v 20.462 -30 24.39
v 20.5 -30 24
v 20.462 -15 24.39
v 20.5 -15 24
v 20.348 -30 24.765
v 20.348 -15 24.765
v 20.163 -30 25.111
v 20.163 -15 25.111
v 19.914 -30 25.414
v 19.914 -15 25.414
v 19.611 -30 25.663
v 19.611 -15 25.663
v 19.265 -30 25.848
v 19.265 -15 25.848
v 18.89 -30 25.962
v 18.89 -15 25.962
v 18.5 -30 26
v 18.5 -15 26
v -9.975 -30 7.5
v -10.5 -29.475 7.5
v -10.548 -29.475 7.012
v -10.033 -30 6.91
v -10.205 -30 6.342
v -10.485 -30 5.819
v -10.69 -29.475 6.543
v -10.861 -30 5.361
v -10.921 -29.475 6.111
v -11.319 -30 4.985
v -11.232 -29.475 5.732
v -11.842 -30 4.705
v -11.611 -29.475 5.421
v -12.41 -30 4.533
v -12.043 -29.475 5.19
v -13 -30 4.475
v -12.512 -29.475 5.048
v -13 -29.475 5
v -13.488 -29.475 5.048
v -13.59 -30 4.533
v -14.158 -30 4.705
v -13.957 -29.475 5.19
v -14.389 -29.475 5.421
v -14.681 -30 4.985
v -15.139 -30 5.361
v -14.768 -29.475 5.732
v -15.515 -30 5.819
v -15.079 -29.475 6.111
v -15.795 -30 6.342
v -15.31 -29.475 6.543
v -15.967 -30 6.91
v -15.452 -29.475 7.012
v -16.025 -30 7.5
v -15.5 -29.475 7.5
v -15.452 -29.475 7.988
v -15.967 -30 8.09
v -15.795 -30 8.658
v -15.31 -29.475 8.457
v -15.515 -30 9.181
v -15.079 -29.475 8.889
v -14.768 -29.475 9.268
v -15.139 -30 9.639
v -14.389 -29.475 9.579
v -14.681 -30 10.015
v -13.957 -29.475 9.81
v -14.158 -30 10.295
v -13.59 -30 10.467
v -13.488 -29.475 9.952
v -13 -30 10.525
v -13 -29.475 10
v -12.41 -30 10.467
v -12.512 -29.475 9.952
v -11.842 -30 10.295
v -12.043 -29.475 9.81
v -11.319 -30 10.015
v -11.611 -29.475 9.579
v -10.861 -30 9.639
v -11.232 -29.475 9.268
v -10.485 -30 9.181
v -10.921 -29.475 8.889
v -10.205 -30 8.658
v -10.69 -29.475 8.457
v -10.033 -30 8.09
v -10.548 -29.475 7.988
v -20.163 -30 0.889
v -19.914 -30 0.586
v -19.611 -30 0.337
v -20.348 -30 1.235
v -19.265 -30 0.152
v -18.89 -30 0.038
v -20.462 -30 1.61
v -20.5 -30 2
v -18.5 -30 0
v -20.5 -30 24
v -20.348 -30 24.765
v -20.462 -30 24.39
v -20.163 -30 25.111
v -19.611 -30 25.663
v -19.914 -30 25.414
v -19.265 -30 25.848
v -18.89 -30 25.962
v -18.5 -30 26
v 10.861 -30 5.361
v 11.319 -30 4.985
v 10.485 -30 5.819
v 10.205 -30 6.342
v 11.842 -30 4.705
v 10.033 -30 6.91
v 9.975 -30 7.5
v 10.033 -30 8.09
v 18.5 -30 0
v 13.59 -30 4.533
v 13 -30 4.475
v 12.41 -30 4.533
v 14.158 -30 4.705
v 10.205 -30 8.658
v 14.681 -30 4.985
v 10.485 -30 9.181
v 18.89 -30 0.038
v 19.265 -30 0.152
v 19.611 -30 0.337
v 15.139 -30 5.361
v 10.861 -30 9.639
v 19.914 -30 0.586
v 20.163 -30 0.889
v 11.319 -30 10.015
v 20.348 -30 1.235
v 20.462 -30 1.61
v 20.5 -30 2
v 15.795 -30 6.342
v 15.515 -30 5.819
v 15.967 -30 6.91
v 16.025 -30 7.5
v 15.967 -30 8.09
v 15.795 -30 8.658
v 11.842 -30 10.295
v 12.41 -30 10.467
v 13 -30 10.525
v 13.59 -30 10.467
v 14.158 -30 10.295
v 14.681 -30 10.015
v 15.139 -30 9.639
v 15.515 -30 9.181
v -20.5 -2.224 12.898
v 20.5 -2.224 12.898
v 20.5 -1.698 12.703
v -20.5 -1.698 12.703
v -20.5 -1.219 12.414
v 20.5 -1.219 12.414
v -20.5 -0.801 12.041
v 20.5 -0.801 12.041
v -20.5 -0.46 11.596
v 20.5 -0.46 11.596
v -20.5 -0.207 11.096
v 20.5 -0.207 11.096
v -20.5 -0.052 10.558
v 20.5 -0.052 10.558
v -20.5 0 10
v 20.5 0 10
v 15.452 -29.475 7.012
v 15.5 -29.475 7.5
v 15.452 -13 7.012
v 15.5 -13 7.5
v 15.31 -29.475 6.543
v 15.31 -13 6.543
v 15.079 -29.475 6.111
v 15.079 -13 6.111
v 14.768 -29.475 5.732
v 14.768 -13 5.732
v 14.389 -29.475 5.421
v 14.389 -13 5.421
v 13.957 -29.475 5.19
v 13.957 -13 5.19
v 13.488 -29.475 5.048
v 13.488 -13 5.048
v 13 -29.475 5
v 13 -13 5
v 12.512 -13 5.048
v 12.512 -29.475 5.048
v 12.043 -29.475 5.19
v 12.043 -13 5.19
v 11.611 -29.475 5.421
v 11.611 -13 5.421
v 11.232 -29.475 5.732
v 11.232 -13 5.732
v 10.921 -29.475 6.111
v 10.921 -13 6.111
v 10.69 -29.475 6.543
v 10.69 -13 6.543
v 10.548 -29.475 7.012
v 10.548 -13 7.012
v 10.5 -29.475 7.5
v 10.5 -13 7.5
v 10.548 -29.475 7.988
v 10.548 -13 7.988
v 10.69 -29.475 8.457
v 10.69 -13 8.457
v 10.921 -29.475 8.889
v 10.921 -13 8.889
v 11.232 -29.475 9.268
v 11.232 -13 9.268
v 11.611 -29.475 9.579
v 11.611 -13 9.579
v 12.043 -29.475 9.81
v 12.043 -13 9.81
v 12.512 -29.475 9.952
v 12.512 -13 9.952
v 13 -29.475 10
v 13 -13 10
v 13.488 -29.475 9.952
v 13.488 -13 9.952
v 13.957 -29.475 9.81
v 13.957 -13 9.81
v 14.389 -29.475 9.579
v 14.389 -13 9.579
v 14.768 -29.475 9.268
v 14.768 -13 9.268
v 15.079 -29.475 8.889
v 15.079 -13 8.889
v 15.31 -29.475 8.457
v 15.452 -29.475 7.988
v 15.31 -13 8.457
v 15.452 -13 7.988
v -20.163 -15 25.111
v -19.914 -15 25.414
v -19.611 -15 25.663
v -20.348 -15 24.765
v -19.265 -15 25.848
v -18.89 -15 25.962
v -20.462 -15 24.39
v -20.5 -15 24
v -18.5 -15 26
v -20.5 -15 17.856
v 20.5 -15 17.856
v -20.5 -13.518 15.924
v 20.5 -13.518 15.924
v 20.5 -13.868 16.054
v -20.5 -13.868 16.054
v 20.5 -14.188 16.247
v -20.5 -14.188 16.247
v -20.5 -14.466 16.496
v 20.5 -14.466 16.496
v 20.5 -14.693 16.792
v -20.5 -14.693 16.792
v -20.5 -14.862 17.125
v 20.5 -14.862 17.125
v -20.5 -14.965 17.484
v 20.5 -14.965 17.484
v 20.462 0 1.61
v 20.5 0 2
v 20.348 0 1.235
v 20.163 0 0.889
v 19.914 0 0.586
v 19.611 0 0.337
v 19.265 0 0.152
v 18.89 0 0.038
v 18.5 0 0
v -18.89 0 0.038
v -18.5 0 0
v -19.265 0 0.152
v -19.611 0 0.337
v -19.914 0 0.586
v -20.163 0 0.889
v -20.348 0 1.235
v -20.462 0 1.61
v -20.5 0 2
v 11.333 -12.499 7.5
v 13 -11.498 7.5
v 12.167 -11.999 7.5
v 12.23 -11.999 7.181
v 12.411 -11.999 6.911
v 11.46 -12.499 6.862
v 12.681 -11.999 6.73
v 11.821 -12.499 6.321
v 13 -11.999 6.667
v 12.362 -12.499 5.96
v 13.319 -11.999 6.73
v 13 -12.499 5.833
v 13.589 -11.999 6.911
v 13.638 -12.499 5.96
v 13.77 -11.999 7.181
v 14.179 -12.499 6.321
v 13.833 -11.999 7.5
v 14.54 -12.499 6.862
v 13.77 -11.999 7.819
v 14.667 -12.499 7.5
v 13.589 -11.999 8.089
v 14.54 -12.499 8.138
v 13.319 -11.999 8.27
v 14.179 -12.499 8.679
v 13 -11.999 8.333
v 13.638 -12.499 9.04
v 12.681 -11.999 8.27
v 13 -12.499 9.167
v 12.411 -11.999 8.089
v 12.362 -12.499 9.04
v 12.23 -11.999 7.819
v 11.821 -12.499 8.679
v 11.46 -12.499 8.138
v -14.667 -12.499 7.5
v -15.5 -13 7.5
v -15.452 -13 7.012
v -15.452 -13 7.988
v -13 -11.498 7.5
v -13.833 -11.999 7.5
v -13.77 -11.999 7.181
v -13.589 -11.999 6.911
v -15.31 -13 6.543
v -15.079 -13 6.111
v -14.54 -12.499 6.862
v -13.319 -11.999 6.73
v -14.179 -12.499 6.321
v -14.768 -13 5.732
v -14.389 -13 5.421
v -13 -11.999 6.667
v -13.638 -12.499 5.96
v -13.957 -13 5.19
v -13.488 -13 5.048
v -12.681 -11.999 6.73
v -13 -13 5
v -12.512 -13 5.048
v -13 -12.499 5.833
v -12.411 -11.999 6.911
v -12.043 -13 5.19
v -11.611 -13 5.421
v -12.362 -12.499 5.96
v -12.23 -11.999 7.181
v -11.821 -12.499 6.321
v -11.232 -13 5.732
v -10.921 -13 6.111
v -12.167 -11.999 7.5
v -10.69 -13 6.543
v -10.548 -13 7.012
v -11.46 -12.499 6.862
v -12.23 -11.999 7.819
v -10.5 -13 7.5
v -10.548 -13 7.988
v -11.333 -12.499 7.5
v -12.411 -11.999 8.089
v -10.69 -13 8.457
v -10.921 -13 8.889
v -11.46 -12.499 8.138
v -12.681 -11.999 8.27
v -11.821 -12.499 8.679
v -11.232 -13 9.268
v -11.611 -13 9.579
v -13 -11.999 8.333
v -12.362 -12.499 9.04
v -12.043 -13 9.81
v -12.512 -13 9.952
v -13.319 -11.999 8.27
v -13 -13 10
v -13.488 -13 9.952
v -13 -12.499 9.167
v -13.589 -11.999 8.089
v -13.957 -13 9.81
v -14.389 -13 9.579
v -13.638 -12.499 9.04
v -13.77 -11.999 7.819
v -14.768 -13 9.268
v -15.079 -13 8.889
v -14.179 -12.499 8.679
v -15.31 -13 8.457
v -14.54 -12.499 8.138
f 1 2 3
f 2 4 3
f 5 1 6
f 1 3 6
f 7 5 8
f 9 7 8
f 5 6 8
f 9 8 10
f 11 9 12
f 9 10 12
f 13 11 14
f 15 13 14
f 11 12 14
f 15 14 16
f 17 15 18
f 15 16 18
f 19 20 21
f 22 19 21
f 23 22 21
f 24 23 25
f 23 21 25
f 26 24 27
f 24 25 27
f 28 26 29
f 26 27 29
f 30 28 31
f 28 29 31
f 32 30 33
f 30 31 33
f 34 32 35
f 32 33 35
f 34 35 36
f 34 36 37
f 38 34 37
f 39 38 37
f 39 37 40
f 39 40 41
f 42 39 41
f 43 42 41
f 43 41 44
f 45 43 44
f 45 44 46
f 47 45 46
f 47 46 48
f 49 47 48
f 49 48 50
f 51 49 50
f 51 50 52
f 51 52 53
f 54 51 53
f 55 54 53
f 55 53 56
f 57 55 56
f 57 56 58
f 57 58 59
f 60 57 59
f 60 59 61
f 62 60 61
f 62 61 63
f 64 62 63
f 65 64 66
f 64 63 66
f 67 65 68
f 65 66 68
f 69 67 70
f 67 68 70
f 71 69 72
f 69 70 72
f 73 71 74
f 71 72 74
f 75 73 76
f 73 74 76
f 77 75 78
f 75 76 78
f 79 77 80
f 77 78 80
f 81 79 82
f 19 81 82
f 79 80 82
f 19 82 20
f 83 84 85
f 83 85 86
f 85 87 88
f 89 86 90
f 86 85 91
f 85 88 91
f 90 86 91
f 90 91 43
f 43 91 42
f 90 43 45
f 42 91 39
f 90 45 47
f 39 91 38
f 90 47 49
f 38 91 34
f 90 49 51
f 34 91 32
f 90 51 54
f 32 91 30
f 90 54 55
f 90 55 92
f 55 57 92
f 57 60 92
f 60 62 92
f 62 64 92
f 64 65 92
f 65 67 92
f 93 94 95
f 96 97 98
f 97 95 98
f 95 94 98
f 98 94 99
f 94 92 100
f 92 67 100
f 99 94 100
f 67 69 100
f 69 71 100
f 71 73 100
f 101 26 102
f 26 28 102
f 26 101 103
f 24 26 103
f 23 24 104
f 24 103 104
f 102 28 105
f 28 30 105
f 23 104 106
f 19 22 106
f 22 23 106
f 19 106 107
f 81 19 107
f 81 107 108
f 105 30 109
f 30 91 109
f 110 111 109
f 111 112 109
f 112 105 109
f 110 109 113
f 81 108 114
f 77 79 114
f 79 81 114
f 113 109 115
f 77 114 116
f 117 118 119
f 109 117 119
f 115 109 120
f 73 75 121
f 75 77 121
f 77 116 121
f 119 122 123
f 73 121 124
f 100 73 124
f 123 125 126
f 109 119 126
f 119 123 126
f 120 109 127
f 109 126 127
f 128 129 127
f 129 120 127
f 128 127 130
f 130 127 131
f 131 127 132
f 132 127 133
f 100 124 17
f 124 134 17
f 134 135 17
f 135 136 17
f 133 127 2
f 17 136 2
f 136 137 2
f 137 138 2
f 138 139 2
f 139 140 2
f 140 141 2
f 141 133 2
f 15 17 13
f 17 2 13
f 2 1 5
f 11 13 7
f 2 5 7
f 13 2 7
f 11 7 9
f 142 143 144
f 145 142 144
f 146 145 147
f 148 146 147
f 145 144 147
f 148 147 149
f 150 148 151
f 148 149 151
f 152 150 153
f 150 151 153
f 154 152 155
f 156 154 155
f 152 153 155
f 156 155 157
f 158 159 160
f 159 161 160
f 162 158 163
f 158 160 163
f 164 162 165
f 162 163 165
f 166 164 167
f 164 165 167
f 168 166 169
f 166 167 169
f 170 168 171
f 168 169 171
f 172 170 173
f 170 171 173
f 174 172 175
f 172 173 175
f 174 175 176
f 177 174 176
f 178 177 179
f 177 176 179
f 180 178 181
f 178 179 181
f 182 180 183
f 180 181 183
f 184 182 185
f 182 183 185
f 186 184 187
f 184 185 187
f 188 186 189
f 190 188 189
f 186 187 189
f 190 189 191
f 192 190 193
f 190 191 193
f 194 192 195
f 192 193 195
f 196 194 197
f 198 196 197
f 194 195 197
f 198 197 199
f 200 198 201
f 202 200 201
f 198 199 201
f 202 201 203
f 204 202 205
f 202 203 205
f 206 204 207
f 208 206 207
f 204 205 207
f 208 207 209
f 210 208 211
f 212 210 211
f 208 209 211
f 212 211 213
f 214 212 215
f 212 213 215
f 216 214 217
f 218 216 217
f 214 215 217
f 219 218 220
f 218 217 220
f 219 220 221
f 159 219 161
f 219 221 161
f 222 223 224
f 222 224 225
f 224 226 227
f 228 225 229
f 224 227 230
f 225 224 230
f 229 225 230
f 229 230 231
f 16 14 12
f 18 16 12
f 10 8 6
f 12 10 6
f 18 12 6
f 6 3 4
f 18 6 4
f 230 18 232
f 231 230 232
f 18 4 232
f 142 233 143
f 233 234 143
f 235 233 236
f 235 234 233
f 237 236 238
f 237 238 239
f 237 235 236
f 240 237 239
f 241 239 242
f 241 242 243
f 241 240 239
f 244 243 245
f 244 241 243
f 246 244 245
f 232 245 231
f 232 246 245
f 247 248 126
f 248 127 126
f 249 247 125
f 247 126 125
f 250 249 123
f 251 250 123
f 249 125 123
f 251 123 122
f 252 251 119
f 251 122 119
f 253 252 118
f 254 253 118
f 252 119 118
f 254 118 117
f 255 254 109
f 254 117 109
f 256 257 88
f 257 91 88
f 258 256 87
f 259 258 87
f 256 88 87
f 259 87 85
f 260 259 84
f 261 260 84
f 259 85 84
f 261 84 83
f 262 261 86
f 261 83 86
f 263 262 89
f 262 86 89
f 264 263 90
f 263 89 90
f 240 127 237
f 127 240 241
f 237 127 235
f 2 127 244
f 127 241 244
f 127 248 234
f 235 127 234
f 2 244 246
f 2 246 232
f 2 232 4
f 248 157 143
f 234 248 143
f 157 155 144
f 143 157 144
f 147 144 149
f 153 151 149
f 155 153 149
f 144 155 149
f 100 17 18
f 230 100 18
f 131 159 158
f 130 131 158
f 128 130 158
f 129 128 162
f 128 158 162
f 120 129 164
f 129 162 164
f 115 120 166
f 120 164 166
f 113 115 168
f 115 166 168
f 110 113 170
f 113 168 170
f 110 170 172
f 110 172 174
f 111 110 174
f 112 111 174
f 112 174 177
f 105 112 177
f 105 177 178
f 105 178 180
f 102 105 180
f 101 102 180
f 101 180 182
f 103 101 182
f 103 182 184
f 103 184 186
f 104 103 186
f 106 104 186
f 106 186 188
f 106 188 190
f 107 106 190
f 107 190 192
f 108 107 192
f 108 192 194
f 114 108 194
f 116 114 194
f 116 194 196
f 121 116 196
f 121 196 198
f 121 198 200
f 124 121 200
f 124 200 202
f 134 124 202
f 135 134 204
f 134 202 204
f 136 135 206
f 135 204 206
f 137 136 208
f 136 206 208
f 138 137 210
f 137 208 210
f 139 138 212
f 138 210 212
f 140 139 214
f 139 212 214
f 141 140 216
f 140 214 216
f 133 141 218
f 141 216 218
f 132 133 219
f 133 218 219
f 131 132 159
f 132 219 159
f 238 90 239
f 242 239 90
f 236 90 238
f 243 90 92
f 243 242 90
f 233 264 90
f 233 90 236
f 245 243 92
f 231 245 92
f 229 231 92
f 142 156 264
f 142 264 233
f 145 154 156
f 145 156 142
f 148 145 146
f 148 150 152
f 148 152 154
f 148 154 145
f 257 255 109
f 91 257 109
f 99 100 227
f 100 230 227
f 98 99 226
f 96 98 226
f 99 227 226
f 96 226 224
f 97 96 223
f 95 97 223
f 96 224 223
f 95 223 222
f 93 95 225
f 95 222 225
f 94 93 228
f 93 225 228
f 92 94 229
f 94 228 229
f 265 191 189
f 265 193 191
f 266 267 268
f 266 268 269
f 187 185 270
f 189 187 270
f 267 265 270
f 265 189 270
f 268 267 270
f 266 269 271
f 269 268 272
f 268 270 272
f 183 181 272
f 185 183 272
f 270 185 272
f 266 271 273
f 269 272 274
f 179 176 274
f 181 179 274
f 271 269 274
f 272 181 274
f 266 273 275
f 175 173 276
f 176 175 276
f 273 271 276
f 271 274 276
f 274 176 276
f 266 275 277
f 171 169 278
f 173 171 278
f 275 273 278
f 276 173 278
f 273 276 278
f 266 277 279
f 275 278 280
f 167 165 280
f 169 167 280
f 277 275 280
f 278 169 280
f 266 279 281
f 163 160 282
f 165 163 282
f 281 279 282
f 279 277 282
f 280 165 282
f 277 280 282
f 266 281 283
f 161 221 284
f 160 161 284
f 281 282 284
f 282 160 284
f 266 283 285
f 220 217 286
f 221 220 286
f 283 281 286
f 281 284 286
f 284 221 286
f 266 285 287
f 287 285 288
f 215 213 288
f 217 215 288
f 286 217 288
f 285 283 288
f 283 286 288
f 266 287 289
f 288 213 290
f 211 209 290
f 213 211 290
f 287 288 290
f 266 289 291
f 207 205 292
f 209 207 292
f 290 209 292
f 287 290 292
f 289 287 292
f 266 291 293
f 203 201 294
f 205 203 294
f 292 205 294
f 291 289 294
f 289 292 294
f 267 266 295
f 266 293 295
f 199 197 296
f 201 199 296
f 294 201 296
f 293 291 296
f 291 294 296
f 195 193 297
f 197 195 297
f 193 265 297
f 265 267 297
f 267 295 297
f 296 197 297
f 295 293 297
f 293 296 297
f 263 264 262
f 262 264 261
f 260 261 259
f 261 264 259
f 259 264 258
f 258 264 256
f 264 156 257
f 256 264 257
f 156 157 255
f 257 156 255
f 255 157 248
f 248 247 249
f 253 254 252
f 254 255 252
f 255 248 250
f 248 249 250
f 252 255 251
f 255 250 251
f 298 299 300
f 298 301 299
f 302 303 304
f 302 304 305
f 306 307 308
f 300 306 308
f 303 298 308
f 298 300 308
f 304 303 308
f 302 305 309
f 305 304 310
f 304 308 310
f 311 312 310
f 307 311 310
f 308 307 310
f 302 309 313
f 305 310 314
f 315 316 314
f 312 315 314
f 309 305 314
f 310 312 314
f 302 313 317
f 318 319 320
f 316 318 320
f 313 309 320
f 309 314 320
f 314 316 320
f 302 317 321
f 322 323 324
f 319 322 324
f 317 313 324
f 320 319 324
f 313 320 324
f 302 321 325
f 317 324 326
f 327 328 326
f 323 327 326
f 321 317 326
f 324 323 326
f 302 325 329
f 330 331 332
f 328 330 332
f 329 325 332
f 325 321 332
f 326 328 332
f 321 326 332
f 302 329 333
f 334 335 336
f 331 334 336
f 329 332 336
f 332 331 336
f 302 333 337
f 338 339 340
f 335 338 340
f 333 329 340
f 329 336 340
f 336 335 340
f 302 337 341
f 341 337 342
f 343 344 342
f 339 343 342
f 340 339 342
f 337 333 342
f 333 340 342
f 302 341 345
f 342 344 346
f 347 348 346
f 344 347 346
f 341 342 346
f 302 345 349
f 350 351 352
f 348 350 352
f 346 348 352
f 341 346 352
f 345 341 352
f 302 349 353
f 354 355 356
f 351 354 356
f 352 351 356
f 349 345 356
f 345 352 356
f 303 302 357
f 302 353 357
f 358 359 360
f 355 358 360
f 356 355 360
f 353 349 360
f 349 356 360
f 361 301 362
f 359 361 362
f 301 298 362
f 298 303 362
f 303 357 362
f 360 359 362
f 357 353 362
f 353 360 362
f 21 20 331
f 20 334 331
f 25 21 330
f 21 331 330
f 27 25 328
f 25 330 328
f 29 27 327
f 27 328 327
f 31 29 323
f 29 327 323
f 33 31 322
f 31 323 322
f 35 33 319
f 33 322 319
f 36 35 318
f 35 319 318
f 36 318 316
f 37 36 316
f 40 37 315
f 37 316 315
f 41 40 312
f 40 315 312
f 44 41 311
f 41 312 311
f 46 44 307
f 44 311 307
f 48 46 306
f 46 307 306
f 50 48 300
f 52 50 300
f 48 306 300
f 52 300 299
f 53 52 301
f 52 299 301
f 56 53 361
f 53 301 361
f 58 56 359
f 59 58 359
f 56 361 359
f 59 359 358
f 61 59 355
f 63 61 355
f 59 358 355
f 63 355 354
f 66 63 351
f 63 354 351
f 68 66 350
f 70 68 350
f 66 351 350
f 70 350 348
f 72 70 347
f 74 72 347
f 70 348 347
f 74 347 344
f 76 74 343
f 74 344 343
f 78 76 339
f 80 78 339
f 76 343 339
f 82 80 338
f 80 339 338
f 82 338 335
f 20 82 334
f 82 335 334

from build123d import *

# Parameters (mm, degrees)
BOSS_EXTRUDE1_DEPTH         = 20.5
FILLET1_R                   = 2
M6_TAPPED_HOLE1_D           = 5
M6_TAPPED_HOLE1_DEPTH       = 17
M6_TAPPED_HOLE1_CSINK_D     = 6.05
M6_TAPPED_HOLE1_CSINK_ANGLE = 90
M6_TAPPED_HOLE1_TIP         = 1.502151548
FILLET2_R                   = 2


with BuildPart() as part:
    # Sketch1 → Boss-Extrude1 (new, symmetric)
    with BuildSketch(Plane(origin=(0, 0, 0), x_dir=(0, 0, -1), z_dir=(1, 0, 0))):
        with BuildLine():
            Line((-10, 0), (0, 0))
            Line((0, 0), (0, -30))
            Line((0, -30), (-26, -30))
            Line((-26, -30), (-26, -15))
            Line((-26, -15), (-16.32121885, -15))
            Line((-16.32121885, -15), (-12.897777479, -2.223542865))
            ThreePointArc((-12.897777479, -2.223542865), (-11.826284287, -0.619939979), (-10, 0))
        make_face()
    extrude(amount=BOSS_EXTRUDE1_DEPTH, both=True)

    # Fillet1
    fillet1_edges = [part.edges().sort_by_distance(p)[0] for p in [
        (20.5, -22.5, 26),
        (20.5, -15, 0),
        (-20.5, -15, 0),
        (-20.5, -22.5, 26),
    ]]
    fillet(fillet1_edges, radius=FILLET1_R)

    # M6 Tapped Hole1
    with Locations(Plane(origin=(0, -30, 0), x_dir=(-1, 0, 0), z_dir=(0, -1, 0))):
        with Locations((-13, -7.5), (13, -7.5)):
            CounterSinkHole(M6_TAPPED_HOLE1_D / 2, M6_TAPPED_HOLE1_CSINK_D / 2, depth=M6_TAPPED_HOLE1_DEPTH, counter_sink_angle=M6_TAPPED_HOLE1_CSINK_ANGLE)
            with Locations((0, 0, -(M6_TAPPED_HOLE1_DEPTH + M6_TAPPED_HOLE1_TIP / 2))):  # 118° drill point
                Cone(0, M6_TAPPED_HOLE1_D / 2, M6_TAPPED_HOLE1_TIP, mode=Mode.SUBTRACT)

    # Fillet2
    fillet2_edges = [part.edges().sort_by_distance(p)[0] for p in [
        (0, -15, 16.32121885),
    ]]
    fillet(fillet2_edges, radius=FILLET2_R)


solid = part.part
